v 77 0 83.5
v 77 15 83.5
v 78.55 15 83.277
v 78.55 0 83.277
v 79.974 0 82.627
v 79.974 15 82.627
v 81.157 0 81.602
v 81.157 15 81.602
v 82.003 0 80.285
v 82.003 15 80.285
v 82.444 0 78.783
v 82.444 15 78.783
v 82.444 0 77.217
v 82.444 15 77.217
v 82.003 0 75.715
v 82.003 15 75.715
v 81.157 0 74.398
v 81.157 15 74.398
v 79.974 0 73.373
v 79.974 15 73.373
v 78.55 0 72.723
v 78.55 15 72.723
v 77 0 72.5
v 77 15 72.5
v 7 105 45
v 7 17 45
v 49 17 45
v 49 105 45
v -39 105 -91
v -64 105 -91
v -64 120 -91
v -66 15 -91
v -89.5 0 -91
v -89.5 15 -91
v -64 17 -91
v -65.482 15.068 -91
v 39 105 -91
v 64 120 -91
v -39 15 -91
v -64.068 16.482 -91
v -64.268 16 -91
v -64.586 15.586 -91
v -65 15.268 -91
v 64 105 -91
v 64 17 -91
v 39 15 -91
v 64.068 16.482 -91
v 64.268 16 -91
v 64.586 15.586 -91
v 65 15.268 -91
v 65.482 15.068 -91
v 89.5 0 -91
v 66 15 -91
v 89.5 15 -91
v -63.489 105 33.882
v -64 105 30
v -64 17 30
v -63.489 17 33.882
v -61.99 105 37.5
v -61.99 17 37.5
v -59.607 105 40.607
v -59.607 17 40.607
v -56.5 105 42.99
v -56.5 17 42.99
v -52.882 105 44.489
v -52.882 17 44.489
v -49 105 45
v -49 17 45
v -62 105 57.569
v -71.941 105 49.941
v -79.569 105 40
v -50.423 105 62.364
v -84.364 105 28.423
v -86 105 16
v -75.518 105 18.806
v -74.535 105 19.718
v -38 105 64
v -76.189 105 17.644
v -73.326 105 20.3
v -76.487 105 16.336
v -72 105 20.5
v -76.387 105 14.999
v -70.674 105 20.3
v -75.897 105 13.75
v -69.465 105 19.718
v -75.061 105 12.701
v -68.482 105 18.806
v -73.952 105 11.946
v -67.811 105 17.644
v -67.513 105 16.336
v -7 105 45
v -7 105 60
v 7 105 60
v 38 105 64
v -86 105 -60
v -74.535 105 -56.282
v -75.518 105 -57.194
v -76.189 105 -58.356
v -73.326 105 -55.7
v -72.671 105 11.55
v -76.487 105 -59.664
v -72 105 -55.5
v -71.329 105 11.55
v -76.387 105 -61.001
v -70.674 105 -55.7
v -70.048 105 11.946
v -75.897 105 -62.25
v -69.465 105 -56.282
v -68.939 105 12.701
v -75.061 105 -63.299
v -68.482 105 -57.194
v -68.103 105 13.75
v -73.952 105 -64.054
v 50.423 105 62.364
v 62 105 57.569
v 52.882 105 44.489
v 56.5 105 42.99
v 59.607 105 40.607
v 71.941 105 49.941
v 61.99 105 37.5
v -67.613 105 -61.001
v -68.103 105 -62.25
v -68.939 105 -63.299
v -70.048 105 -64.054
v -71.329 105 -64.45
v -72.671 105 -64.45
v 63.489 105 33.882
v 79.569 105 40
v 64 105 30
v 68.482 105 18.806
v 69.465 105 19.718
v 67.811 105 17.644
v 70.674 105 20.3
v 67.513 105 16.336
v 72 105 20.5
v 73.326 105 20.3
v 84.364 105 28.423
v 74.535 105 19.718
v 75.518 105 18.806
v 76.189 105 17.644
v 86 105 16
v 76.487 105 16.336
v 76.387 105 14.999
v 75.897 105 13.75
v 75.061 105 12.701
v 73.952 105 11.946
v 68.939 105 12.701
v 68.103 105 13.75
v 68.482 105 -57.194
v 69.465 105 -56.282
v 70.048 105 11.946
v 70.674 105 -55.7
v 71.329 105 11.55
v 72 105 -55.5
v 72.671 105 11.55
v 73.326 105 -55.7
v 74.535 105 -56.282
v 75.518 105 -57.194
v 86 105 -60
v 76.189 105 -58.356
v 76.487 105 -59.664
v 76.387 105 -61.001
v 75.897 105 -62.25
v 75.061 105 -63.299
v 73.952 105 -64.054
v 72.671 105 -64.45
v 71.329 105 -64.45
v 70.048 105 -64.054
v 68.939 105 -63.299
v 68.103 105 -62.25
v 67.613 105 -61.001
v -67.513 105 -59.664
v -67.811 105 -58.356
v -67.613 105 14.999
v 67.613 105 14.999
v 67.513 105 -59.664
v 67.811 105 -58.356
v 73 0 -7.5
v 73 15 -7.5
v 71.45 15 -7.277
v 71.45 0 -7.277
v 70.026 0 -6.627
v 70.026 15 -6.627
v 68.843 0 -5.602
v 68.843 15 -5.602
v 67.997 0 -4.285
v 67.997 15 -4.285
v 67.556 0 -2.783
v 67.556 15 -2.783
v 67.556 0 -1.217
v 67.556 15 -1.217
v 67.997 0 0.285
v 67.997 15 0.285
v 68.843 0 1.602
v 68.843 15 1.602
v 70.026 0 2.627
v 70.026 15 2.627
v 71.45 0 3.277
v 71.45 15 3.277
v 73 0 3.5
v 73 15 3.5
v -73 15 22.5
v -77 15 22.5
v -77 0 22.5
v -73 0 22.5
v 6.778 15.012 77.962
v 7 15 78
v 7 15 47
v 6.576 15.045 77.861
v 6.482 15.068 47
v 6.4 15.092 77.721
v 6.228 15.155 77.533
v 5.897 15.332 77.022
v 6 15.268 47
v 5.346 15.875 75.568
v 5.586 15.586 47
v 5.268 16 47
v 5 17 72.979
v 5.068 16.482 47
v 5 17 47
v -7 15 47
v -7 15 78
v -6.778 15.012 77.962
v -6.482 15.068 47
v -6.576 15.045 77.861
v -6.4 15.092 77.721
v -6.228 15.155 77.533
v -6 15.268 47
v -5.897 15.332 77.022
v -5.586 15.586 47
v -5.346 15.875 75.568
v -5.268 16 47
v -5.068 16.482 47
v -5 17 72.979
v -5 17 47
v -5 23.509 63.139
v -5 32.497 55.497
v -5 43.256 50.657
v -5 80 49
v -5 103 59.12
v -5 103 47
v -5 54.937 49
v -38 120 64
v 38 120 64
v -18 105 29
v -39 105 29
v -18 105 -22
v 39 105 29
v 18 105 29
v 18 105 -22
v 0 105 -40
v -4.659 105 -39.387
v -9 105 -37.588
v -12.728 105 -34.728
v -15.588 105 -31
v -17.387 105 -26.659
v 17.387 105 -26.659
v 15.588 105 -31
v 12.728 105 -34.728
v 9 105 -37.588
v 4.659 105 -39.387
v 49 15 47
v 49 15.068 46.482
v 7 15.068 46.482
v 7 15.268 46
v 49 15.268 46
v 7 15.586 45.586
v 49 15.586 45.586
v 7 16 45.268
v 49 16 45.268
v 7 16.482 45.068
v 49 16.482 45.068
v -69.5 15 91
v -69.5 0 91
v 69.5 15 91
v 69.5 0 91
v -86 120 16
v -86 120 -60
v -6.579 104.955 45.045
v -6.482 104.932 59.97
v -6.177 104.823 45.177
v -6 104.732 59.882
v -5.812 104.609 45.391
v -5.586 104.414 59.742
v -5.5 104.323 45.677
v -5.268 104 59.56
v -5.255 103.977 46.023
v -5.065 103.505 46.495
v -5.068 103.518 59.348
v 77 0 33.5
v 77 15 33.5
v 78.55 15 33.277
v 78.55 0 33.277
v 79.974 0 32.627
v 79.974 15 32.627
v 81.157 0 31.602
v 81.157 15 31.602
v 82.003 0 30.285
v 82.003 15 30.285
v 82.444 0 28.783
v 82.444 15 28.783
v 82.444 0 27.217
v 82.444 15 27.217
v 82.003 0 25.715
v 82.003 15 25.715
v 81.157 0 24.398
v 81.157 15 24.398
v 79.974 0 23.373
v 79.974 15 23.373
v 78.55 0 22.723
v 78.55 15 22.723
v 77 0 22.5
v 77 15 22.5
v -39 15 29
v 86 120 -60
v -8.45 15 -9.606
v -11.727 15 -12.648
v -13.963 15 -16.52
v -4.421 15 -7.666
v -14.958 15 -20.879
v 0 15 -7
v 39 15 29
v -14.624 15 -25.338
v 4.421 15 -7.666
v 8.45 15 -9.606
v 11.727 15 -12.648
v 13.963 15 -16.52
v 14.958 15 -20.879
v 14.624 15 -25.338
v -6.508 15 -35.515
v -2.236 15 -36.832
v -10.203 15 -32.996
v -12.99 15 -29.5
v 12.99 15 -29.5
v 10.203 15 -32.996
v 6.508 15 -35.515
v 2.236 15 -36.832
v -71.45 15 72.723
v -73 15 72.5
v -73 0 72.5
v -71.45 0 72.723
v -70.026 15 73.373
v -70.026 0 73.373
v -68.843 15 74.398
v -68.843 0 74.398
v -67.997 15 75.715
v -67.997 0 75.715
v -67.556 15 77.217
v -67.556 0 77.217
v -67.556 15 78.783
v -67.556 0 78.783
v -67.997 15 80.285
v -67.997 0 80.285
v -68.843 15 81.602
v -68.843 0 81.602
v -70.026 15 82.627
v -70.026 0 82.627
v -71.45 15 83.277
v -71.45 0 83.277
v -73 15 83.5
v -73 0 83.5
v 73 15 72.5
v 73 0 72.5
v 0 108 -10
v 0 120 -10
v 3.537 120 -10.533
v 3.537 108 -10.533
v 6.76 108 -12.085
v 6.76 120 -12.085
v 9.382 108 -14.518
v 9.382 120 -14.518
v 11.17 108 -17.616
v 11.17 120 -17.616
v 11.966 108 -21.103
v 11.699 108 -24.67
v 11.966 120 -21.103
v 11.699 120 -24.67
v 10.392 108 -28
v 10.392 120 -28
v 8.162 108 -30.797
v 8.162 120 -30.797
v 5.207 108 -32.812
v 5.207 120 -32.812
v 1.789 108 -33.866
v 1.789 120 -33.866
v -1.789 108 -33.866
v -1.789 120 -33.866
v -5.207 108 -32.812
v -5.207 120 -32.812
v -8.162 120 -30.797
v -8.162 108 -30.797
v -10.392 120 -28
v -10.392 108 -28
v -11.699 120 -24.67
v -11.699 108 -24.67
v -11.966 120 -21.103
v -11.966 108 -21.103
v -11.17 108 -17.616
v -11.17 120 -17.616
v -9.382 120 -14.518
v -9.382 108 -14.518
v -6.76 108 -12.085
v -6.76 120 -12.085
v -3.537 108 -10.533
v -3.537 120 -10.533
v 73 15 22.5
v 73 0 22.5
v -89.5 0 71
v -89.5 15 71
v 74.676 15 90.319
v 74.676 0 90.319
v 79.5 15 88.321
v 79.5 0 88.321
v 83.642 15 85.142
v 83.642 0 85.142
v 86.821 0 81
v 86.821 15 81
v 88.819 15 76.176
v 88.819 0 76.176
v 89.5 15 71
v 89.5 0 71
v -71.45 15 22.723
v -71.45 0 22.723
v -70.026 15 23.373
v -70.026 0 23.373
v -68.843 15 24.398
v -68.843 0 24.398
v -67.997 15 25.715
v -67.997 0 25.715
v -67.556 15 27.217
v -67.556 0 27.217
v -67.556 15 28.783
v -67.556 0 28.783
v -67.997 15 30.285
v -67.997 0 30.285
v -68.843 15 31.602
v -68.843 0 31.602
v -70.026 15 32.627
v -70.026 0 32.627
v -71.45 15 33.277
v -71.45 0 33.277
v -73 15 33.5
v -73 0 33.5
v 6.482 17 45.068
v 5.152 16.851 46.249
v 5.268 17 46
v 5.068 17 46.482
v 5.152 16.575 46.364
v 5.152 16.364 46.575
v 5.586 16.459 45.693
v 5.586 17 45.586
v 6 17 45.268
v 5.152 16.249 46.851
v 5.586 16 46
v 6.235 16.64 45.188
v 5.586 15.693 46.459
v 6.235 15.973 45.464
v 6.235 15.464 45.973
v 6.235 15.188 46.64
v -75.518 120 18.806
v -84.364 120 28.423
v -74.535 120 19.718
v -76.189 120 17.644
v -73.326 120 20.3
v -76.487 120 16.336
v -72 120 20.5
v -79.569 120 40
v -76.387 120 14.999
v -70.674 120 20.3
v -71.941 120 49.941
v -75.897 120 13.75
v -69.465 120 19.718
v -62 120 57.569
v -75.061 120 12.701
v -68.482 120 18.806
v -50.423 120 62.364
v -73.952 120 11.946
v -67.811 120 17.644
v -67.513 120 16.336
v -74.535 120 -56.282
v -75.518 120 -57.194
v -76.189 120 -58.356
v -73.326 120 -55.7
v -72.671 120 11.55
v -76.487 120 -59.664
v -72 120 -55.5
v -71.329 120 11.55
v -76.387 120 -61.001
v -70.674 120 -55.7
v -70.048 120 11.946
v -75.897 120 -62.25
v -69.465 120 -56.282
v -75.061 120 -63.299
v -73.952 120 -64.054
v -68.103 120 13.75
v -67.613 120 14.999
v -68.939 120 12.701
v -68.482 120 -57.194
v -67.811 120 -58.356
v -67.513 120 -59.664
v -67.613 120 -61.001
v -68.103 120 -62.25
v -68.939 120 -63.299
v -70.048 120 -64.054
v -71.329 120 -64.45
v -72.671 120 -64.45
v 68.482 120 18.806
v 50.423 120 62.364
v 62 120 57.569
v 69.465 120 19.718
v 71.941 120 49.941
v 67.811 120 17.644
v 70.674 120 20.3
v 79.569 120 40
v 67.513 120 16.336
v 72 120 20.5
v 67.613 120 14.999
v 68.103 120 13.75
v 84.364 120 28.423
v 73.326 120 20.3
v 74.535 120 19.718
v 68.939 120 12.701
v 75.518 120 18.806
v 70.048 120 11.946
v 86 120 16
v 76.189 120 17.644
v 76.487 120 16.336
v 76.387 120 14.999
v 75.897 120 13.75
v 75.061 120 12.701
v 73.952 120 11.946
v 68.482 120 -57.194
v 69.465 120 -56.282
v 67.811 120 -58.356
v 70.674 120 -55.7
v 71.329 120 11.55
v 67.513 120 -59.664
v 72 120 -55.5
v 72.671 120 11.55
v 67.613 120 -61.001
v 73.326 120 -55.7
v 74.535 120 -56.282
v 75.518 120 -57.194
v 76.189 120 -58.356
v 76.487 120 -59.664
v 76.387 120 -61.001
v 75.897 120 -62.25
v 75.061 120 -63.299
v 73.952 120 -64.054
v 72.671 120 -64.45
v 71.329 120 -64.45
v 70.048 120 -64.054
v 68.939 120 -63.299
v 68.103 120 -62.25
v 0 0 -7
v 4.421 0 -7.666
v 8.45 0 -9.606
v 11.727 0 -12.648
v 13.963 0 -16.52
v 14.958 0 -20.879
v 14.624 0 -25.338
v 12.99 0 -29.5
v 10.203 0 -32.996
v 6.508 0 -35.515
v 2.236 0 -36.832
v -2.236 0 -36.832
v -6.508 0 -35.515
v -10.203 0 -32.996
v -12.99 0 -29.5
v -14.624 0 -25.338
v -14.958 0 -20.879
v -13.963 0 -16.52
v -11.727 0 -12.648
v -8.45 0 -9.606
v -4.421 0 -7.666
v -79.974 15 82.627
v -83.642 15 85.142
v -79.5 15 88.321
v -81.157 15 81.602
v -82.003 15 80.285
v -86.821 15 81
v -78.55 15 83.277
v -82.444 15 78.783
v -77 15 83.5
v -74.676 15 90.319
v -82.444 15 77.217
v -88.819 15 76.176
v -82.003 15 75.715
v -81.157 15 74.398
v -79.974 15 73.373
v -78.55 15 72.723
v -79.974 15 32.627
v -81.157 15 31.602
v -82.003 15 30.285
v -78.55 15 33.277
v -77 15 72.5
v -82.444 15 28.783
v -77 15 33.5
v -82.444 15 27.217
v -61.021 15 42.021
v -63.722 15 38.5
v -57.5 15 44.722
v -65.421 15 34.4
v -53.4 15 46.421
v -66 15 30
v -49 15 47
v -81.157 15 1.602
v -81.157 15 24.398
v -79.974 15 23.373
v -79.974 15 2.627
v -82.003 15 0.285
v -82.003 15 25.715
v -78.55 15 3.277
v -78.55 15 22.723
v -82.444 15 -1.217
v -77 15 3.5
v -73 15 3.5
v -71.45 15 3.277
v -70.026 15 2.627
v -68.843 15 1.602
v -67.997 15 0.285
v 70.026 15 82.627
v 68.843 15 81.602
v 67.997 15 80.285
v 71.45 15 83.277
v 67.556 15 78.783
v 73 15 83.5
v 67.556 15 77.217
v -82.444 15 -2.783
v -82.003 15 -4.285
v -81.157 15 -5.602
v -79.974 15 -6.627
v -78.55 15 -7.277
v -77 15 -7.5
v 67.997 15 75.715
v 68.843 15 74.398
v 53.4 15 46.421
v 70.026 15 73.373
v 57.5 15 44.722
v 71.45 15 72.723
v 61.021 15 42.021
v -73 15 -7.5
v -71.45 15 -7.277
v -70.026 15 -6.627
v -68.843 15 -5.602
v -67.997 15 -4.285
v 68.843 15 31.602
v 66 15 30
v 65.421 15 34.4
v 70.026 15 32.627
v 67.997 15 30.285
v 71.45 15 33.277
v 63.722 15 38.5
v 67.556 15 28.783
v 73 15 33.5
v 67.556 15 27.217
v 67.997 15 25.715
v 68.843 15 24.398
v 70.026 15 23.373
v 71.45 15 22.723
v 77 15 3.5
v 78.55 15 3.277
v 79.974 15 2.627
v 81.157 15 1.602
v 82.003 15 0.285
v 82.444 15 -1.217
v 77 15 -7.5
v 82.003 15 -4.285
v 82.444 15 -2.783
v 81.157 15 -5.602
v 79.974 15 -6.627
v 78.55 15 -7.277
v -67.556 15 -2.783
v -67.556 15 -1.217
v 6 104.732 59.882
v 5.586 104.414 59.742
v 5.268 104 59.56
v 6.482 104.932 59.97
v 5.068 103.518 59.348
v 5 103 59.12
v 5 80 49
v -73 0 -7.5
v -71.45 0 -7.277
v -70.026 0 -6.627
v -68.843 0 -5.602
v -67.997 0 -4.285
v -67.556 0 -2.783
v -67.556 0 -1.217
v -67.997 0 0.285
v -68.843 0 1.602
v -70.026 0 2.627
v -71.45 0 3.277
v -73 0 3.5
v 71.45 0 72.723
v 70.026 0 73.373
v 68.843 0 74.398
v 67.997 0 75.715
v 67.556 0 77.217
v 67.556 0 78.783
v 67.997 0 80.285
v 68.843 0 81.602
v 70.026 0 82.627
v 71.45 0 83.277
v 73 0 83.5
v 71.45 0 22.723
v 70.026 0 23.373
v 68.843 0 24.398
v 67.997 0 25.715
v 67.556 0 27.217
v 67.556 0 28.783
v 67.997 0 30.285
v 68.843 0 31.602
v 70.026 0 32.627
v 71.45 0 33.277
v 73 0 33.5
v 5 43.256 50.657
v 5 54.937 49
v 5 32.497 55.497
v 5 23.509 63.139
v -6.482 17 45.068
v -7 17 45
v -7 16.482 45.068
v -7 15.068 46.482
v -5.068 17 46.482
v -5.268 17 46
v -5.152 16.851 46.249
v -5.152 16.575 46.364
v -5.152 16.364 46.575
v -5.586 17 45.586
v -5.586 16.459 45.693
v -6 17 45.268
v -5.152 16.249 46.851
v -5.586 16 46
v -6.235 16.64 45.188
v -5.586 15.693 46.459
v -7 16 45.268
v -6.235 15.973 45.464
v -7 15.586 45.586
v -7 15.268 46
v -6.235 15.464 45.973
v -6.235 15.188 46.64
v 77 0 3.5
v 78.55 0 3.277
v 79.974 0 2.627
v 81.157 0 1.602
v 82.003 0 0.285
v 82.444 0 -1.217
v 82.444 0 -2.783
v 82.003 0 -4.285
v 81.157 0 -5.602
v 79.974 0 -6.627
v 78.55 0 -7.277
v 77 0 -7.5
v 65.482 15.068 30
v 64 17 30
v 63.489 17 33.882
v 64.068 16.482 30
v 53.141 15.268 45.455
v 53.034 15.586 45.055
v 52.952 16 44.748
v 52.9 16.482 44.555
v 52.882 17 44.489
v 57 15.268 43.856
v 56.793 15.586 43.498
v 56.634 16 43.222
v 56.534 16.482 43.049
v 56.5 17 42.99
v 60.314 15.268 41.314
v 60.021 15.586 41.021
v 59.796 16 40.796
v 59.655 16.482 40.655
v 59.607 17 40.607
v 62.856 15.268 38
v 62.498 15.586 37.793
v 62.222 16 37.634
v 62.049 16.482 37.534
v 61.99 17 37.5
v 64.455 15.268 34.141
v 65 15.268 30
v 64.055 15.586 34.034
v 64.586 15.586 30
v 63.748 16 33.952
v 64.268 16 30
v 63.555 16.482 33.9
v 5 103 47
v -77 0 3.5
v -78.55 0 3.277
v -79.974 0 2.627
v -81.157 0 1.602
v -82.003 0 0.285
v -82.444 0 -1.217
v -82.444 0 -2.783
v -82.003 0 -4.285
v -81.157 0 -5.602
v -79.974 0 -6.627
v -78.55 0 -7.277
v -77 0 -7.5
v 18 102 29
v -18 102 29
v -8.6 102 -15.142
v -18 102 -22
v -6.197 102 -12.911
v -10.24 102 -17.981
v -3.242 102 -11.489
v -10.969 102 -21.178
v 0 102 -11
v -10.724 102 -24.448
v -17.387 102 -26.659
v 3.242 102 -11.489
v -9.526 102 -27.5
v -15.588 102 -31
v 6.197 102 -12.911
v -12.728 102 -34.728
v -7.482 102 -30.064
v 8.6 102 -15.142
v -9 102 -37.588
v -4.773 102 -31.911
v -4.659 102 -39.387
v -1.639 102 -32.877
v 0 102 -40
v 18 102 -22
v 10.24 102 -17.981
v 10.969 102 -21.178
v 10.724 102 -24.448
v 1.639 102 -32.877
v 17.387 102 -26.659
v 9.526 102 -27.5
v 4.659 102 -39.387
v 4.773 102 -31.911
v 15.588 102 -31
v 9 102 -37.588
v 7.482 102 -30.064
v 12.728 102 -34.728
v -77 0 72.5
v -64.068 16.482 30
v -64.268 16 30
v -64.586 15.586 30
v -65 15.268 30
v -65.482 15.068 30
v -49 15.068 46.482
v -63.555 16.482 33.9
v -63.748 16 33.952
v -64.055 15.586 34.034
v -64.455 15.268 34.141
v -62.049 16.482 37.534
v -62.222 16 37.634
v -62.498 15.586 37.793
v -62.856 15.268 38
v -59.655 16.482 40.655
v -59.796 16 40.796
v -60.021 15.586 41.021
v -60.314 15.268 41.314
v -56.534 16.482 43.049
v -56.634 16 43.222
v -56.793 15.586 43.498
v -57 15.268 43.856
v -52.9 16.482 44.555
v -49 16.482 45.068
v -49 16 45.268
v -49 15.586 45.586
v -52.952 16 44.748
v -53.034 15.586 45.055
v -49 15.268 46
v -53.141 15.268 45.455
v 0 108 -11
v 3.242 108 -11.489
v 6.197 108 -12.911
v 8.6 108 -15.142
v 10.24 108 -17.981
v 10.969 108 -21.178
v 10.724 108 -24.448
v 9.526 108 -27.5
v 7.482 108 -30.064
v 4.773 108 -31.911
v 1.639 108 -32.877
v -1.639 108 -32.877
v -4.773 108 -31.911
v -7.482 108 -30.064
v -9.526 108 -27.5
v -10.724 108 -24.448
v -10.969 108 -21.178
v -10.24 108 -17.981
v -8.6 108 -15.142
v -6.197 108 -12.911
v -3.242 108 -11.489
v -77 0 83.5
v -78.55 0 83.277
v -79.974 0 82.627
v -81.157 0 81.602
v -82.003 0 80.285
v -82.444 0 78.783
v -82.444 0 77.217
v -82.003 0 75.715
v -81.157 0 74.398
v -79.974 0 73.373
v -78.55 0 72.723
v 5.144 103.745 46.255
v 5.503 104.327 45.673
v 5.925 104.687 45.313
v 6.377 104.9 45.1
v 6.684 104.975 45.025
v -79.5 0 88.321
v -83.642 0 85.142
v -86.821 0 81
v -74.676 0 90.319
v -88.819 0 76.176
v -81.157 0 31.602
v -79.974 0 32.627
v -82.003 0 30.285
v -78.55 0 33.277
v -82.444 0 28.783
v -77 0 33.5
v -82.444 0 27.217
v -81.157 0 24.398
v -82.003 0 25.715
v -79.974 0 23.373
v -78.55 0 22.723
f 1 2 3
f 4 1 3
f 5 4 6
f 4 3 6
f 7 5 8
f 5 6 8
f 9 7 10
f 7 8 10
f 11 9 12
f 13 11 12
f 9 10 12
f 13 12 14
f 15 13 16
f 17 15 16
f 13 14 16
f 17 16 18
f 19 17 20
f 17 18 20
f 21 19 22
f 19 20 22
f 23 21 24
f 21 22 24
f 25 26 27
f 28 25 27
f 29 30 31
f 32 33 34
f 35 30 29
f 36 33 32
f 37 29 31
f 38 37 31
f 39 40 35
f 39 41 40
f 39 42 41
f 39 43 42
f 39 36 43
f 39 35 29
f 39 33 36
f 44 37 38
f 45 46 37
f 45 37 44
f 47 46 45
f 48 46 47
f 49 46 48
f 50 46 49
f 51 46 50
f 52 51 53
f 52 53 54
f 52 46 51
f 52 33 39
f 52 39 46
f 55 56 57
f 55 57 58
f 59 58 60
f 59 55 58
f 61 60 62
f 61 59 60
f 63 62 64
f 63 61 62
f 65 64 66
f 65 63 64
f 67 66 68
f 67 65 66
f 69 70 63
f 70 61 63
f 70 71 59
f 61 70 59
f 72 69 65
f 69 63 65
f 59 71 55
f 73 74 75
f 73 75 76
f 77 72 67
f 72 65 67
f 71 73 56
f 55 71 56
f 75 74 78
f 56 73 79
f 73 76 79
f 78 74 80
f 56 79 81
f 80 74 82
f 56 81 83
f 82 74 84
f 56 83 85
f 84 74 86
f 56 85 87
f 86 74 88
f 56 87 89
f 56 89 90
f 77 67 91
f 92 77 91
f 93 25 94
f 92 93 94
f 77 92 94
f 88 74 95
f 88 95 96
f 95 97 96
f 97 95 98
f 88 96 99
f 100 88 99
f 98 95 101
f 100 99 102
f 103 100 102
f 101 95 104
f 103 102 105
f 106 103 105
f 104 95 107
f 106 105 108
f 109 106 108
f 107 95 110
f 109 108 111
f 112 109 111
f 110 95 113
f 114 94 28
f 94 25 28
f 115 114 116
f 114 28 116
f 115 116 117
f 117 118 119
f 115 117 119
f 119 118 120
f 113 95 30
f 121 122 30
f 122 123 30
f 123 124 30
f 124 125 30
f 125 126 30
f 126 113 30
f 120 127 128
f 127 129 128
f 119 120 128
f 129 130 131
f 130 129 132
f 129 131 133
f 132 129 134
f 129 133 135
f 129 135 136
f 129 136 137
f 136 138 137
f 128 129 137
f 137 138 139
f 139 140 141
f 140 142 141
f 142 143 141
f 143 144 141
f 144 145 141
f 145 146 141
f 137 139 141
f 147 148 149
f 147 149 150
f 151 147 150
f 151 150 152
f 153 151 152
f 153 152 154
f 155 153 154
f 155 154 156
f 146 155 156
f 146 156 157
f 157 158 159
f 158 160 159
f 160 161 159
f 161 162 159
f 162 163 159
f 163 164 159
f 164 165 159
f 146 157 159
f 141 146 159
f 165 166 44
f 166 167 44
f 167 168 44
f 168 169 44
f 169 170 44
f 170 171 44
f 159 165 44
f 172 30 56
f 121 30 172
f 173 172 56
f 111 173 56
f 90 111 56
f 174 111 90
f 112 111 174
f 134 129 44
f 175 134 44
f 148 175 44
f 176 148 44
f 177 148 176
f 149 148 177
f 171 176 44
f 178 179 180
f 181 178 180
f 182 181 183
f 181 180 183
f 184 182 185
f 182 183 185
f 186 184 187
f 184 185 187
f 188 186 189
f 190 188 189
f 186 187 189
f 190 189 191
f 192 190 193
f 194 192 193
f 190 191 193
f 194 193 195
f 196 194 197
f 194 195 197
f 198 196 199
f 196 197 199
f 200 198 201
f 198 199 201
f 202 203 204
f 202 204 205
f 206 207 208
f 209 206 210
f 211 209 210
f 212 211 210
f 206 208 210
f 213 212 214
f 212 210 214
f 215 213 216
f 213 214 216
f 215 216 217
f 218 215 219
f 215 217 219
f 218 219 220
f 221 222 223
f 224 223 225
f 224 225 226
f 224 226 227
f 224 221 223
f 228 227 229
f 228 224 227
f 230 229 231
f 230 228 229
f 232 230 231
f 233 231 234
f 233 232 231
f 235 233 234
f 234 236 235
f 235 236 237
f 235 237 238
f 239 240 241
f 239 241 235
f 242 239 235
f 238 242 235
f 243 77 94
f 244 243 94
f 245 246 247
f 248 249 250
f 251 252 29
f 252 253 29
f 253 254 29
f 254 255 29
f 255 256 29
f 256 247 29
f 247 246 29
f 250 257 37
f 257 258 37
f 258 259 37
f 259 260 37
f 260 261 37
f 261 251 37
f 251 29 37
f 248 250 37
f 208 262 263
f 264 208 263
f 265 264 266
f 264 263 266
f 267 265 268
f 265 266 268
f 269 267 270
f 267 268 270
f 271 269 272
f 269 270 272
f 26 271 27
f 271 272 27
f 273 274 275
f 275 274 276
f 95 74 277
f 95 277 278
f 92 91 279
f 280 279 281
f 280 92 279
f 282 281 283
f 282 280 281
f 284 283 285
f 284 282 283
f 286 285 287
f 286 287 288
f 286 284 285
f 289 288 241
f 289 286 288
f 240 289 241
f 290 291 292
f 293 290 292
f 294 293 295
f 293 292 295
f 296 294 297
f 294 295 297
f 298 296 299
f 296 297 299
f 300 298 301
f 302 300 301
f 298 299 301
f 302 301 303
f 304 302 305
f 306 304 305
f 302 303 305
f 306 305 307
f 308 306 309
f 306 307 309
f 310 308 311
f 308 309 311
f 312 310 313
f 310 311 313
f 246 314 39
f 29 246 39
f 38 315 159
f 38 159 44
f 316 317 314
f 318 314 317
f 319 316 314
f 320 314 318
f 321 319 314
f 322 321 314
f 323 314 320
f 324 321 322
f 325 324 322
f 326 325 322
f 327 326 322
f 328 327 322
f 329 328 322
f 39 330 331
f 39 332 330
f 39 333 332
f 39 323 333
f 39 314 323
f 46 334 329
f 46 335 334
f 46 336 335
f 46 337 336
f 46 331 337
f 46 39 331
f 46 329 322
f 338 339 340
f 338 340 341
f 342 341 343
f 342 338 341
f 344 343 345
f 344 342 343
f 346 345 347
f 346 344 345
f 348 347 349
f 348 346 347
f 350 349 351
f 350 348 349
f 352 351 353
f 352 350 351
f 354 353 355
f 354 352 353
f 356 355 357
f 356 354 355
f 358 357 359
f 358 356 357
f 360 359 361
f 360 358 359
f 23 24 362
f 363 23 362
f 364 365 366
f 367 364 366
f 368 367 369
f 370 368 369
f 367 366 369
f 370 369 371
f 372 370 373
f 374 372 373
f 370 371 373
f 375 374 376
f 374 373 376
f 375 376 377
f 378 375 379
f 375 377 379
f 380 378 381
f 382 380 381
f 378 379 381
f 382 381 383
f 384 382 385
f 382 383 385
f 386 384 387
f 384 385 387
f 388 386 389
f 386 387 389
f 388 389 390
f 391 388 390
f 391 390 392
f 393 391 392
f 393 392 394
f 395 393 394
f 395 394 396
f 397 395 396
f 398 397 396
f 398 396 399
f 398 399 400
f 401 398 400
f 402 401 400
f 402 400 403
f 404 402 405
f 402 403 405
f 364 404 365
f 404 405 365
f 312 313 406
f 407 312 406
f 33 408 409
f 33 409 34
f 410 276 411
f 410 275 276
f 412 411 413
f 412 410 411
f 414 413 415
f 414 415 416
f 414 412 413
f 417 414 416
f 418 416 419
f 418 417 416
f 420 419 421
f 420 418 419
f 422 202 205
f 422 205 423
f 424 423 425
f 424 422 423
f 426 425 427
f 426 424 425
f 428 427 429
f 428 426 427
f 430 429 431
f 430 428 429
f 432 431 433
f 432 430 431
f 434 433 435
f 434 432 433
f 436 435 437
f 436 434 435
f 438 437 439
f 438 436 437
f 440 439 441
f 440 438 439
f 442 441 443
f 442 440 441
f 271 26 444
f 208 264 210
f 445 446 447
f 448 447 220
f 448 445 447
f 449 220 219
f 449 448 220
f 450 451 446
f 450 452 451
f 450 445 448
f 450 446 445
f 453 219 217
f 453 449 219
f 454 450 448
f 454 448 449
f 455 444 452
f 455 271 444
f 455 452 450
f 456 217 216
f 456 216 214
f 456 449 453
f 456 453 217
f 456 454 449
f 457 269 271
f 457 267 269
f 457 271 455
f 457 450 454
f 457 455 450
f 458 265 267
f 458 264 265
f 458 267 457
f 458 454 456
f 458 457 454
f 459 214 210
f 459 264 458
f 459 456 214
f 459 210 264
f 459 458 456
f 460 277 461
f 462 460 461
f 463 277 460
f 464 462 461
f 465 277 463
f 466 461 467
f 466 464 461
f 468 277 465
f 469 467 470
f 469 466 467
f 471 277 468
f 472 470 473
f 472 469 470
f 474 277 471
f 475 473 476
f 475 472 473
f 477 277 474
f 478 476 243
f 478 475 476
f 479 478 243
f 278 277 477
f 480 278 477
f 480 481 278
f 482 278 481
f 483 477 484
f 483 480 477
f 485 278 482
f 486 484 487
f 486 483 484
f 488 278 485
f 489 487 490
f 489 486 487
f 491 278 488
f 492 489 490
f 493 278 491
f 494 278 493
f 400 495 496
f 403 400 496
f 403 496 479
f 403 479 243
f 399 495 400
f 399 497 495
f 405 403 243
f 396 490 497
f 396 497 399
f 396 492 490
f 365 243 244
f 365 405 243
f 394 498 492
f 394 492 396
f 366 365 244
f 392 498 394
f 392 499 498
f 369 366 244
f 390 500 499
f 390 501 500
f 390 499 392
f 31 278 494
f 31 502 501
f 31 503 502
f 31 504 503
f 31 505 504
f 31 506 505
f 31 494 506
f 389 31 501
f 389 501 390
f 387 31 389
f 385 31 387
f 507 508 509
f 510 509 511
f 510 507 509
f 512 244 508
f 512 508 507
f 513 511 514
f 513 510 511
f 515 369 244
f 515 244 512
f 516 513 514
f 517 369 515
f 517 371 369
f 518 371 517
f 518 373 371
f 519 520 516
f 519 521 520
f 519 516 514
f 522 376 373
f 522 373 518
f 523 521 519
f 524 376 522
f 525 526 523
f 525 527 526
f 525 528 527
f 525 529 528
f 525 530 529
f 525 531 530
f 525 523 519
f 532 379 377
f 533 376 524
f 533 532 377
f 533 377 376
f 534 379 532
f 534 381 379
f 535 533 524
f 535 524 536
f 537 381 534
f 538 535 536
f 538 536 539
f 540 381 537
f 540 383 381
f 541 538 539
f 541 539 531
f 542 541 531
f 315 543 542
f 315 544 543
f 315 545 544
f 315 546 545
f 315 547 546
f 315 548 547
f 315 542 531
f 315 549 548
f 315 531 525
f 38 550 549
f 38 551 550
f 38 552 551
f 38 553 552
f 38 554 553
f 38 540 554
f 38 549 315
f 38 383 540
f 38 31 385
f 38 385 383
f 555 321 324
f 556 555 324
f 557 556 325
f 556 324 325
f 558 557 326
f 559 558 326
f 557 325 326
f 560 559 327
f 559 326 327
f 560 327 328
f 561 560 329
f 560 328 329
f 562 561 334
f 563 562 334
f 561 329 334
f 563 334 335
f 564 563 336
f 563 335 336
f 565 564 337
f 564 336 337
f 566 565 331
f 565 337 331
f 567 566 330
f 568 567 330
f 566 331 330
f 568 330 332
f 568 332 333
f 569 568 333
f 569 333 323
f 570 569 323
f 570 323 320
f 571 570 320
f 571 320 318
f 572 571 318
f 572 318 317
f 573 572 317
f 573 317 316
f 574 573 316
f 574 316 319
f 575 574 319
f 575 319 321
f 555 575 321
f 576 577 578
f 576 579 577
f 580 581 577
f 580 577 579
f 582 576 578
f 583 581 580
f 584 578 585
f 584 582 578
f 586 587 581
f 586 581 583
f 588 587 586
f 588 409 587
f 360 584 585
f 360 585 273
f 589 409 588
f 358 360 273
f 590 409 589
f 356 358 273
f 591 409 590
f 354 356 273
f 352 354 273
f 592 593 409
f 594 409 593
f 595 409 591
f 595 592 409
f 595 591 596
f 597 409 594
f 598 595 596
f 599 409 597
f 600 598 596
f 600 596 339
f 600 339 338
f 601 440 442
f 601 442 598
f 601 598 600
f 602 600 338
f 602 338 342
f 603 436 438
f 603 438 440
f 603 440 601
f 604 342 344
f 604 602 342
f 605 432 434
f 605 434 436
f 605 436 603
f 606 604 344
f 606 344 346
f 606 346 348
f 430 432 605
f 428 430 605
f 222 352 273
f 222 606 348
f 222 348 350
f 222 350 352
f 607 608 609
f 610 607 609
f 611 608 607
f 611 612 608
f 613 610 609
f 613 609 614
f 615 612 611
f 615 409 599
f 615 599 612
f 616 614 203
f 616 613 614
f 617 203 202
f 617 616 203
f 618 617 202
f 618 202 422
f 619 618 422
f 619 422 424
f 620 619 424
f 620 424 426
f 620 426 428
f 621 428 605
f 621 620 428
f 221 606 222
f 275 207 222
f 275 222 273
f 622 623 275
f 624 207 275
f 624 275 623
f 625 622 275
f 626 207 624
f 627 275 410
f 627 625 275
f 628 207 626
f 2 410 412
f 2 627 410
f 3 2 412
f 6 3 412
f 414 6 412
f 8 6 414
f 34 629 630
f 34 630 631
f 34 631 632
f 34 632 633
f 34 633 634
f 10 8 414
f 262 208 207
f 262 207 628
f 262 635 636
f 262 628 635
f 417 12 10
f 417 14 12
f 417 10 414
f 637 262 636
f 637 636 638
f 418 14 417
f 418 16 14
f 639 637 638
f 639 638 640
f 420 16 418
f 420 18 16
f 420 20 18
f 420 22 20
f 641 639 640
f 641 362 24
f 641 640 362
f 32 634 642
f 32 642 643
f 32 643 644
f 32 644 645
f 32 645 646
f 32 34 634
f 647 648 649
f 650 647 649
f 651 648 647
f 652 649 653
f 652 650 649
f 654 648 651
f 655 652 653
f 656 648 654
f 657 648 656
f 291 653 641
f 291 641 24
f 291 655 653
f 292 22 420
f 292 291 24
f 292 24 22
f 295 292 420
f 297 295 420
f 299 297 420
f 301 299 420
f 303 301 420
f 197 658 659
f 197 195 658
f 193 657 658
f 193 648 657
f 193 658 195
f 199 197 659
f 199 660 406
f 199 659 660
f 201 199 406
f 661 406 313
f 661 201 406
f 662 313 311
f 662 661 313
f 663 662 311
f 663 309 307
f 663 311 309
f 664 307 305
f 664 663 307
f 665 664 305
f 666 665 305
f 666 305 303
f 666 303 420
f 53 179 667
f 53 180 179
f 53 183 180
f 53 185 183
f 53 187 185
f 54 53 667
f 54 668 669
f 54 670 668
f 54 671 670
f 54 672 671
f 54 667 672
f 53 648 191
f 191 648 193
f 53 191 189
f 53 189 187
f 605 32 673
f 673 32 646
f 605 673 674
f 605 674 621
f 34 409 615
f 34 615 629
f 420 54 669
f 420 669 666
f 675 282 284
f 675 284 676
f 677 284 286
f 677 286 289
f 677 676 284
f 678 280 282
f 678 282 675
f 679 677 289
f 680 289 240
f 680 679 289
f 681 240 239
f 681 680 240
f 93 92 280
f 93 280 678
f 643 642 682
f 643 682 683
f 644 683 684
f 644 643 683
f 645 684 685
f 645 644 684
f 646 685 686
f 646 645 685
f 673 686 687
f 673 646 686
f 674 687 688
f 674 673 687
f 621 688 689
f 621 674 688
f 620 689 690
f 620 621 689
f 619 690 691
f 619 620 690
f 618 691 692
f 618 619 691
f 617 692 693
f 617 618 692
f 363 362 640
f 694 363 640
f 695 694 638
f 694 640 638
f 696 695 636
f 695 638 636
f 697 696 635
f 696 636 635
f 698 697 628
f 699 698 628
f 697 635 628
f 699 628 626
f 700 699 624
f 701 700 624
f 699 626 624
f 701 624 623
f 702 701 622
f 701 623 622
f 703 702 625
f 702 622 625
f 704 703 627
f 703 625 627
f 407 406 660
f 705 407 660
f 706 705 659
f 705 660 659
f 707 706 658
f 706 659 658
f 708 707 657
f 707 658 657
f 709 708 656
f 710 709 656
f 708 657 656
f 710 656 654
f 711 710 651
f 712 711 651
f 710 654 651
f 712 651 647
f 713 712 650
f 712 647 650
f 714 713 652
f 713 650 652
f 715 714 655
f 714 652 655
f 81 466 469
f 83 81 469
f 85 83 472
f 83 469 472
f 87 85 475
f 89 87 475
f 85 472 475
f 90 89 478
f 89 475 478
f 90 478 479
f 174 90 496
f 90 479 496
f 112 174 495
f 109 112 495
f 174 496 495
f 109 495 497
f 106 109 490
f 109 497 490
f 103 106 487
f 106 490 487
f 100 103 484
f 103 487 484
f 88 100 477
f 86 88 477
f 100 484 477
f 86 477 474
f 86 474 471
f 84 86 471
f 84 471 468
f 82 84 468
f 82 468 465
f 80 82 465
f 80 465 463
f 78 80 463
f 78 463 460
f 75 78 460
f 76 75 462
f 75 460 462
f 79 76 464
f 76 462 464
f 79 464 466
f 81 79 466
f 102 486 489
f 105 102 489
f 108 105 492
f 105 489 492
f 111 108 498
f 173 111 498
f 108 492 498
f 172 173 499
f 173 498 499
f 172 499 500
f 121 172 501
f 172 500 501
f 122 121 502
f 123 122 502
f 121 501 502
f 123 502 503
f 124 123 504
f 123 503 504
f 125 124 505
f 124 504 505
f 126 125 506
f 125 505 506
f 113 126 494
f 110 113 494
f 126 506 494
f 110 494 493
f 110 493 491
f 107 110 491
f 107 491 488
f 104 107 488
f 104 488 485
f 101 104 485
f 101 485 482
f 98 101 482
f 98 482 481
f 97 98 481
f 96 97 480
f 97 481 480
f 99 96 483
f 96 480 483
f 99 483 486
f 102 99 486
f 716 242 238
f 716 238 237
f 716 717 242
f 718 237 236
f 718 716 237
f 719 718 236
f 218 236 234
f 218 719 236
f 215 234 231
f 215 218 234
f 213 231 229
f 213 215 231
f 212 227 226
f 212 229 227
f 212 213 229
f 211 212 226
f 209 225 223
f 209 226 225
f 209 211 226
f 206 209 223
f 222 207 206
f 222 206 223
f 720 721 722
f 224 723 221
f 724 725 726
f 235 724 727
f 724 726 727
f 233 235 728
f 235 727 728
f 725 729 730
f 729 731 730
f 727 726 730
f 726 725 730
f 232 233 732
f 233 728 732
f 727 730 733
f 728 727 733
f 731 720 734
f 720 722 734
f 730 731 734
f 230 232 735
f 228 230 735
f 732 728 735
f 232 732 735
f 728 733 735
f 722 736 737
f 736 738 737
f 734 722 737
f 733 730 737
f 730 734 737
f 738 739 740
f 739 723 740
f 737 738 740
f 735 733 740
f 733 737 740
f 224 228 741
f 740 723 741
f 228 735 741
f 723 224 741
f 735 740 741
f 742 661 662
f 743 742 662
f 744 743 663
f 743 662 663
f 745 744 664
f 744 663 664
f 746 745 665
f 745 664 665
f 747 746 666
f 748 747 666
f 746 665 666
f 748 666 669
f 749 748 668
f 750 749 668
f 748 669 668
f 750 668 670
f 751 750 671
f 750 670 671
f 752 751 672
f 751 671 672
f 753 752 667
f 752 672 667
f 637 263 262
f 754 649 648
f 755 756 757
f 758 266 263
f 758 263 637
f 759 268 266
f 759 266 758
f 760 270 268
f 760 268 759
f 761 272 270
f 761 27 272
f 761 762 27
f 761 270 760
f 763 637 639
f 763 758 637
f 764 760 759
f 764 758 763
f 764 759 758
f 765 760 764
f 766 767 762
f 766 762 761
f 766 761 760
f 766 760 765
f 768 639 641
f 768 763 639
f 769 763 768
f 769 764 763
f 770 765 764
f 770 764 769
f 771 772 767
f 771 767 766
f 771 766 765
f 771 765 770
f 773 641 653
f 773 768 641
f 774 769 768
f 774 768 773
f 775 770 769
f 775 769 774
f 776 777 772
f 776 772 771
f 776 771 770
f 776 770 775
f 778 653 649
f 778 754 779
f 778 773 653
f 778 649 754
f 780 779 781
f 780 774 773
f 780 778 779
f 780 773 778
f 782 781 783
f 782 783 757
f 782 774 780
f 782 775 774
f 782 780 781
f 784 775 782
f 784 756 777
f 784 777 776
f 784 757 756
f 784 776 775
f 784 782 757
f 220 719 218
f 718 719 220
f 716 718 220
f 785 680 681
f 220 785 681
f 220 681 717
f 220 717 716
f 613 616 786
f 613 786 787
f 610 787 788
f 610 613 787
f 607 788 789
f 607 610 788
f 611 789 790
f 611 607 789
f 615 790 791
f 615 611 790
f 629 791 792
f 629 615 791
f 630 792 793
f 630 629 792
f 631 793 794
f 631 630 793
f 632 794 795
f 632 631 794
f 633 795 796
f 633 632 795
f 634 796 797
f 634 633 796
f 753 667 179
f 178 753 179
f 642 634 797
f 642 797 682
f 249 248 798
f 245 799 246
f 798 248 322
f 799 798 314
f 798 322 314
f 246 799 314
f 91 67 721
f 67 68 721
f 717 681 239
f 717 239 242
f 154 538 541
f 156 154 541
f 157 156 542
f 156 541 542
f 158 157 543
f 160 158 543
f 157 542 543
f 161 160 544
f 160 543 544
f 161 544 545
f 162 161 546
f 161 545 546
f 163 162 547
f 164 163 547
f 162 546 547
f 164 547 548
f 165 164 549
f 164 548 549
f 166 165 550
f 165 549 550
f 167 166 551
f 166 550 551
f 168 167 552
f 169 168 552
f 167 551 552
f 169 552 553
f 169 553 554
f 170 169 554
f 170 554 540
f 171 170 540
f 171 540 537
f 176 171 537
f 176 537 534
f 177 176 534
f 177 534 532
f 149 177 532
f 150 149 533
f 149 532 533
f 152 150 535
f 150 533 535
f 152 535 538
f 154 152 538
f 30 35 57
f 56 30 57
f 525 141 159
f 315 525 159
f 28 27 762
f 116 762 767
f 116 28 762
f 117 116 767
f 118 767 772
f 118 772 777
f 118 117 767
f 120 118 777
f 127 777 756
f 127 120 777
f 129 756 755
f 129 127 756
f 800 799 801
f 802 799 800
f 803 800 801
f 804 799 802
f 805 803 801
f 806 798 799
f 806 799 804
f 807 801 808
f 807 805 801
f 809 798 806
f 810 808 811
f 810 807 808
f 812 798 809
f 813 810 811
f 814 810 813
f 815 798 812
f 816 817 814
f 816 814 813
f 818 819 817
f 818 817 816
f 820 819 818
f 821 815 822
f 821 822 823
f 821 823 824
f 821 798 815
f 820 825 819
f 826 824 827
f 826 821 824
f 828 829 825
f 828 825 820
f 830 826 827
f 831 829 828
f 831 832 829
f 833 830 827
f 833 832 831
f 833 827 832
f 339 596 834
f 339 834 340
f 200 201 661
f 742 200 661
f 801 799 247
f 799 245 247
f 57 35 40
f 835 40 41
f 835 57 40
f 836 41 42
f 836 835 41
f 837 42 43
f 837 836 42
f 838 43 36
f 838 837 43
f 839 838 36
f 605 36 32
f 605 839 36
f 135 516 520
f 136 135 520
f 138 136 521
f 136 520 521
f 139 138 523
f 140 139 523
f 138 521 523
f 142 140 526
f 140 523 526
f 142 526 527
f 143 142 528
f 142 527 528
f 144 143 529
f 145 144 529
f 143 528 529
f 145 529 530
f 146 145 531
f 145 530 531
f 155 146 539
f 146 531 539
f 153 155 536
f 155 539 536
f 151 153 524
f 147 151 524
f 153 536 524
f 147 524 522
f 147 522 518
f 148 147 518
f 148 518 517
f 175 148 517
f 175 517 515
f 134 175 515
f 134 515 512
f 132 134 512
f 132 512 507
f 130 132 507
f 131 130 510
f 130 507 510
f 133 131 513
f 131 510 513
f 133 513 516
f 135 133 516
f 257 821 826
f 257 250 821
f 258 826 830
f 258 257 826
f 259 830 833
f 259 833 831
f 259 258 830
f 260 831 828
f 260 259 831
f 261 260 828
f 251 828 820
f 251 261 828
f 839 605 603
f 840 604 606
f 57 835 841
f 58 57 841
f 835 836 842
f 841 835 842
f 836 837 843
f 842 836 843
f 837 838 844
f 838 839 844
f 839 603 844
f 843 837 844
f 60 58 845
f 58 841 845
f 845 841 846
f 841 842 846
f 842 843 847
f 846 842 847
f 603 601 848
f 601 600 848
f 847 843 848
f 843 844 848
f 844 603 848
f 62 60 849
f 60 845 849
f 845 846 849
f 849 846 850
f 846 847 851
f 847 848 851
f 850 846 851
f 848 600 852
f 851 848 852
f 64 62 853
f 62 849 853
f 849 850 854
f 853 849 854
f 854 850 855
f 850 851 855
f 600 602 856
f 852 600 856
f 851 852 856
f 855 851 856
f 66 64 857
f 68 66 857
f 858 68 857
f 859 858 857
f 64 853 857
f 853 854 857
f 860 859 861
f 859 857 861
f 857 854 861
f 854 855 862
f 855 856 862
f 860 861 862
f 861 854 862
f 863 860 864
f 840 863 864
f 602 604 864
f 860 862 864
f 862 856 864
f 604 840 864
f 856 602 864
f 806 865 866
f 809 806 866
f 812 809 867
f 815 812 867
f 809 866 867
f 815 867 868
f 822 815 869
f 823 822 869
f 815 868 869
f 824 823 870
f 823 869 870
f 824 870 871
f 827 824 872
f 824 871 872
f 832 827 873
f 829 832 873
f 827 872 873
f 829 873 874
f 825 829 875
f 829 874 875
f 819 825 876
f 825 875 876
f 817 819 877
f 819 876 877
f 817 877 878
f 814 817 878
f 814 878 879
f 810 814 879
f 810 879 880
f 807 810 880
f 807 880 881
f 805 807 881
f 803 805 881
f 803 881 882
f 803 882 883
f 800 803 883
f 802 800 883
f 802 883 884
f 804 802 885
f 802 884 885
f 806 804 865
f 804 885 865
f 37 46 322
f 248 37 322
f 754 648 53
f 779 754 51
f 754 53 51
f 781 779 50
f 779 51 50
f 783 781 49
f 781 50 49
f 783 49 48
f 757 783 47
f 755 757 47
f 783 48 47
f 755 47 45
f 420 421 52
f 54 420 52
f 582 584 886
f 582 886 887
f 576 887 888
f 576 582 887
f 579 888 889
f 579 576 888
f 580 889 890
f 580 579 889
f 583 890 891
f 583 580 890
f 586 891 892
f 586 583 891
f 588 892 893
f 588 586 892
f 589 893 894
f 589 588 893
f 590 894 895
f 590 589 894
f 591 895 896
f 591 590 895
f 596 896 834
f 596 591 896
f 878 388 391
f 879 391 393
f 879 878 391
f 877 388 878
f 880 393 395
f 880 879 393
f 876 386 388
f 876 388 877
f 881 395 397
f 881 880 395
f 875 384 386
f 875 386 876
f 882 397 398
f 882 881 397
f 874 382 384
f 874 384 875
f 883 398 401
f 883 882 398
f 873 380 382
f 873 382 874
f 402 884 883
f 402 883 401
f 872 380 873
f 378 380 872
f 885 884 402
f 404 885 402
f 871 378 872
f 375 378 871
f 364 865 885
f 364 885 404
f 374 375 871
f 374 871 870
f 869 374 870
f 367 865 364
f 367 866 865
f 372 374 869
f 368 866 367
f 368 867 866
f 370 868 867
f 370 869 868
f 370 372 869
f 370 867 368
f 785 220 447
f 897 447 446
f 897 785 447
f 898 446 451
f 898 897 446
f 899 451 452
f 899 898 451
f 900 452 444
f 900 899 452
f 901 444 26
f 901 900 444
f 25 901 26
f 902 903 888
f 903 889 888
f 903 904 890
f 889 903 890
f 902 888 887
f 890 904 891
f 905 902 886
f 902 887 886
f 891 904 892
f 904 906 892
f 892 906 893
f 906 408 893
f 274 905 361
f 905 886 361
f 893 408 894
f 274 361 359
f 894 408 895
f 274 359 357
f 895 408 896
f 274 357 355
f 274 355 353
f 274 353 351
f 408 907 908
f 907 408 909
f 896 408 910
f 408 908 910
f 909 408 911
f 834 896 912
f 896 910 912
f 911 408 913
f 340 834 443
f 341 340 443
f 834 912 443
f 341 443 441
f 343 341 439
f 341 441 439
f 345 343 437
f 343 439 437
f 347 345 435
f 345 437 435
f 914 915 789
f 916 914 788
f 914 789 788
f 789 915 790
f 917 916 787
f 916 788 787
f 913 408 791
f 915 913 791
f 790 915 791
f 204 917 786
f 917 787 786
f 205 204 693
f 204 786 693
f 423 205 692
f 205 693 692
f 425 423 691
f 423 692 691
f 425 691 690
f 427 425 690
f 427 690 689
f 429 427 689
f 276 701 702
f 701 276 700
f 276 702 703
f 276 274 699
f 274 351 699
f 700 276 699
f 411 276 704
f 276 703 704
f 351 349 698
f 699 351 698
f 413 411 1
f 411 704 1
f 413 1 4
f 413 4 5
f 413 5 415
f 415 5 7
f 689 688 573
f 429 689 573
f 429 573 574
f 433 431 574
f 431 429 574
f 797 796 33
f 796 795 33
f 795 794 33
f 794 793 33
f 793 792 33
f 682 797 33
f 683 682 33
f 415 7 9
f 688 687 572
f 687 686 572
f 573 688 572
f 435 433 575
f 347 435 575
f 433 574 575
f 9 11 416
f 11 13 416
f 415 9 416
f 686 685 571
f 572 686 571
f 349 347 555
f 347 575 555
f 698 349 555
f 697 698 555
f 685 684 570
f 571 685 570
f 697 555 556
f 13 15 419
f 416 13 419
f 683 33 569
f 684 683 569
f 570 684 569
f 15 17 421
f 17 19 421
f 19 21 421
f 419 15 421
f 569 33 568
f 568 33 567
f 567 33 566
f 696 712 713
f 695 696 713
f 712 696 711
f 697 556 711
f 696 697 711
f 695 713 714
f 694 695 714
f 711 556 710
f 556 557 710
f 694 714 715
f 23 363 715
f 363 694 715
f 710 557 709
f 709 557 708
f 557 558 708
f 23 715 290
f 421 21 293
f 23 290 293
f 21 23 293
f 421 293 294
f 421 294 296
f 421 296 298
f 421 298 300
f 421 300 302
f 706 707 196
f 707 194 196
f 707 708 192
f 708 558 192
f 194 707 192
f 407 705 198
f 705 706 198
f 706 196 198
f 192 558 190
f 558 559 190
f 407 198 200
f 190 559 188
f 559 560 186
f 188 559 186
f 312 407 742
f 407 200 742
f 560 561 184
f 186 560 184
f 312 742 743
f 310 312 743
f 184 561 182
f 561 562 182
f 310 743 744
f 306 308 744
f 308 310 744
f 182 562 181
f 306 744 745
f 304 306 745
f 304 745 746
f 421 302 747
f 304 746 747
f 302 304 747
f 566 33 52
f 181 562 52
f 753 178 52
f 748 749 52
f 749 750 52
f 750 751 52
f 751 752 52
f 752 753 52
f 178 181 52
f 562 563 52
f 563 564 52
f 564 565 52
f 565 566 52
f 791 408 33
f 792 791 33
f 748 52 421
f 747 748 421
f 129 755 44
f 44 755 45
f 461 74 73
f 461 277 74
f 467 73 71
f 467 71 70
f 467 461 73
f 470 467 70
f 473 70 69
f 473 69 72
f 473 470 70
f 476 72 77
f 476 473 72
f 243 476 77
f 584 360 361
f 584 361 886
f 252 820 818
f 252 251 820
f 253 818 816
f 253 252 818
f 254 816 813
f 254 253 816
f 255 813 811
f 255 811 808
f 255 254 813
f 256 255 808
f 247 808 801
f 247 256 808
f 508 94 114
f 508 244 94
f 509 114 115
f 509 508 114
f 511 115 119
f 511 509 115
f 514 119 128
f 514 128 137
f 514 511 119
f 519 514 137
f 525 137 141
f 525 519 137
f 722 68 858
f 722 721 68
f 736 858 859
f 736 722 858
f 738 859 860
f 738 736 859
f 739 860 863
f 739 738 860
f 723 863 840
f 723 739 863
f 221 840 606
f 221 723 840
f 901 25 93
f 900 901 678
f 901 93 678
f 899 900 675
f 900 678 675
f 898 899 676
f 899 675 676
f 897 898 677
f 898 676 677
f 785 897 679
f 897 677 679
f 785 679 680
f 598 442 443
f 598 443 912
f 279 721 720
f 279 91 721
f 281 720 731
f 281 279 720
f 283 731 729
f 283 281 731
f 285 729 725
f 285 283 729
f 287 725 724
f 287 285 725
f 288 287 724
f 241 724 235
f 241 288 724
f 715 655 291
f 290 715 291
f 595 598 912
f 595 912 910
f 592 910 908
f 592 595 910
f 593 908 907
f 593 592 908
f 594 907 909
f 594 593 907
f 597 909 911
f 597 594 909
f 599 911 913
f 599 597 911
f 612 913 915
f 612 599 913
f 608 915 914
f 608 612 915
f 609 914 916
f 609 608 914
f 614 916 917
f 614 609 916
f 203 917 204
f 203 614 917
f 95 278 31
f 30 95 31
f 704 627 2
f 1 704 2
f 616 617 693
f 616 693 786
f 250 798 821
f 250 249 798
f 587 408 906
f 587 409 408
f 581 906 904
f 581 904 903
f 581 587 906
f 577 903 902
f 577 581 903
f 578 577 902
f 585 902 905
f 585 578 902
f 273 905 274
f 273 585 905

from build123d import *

# Parameters (mm, degrees)
SKETCH_1_W          = 179
SKETCH_1_H          = 182
EXTRUDE_1_DEPTH     = 15
SKETCH_2_R          = 15
CUT_EXTRUDE_1_DEPTH = 129.51556326
CUT_EXTRUDE_3_DEPTH = 129.51556326
FILLET_1_R          = 20
EXTRUDE_2_DEPTH     = 90
FILLET_2_R          = 15
EXTRUDE_3_DEPTH     = 5
SKETCH_7_W          = 172
SKETCH_7_H          = 155
EXTRUDE_4_DEPTH     = 15
CUT_EXTRUDE_4_DEPTH = 15
FILLET_3_R          = 48
SKETCH_9_R          = 4.5
CUT_EXTRUDE_5_DEPTH = 15
SKETCH_11_W         = 69
SKETCH_11_H         = 3
EXTRUDE_5_DEPTH     = 18
FILLET_4_R          = 18
SKETCH_12_R         = 12
CUT_EXTRUDE_6_DEPTH = 12
SKETCH_13_R         = 11
CUT_EXTRUDE_7_DEPTH = 6
FILLET_5_R          = 2


with BuildPart() as part:
    # 草图1 → 凸台-拉伸1 (new body)
    with BuildSketch(Plane(origin=(0, 0, 0), x_dir=(1, 0, 0), z_dir=(0, 1, 0))):
        Rectangle(SKETCH_1_W, SKETCH_1_H)
    extrude(amount=EXTRUDE_1_DEPTH)

    # 草图2 → 切除-拉伸1 (cut, through all)
    with BuildSketch(Plane(origin=(0, 15, 0), x_dir=(1, 0, 0), z_dir=(0, 1, 0))):
        with Locations(Location((0, 22, 0), (0, 0, 270))):
            Circle(SKETCH_2_R)
    extrude(amount=-CUT_EXTRUDE_1_DEPTH, mode=Mode.SUBTRACT)

    # 草图4 → 切除-拉伸3 (cut, through all)
    with BuildSketch(Plane(origin=(0, 15, 0), x_dir=(1, 0, 0), z_dir=(0, 1, 0))):
        with BuildLine():
            Line((-77, -72.5), (-73, -72.5))
            ThreePointArc((-73, -72.5), (-67.5, -78), (-73, -83.5))
            Line((-73, -83.5), (-77, -83.5))
            ThreePointArc((-77, -83.5), (-82.5, -78), (-77, -72.5))
        make_face()
        with BuildLine():
            Line((-77, -22.5), (-73, -22.5))
            ThreePointArc((-73, -22.5), (-67.5, -28), (-73, -33.5))
            Line((-73, -33.5), (-77, -33.5))
            ThreePointArc((-77, -33.5), (-82.5, -28), (-77, -22.5))
        make_face()
        with BuildLine():
            Line((-77, 7.5), (-73, 7.5))
            ThreePointArc((-73, 7.5), (-67.5, 2), (-73, -3.5))
            Line((-73, -3.5), (-77, -3.5))
            ThreePointArc((-77, -3.5), (-82.5, 2), (-77, 7.5))
        make_face()
        with BuildLine():
            Line((77, 7.5), (73, 7.5))
            ThreePointArc((73, 7.5), (67.5, 2), (73, -3.5))
            Line((73, -3.5), (77, -3.5))
            ThreePointArc((77, -3.5), (82.5, 2), (77, 7.5))
        make_face()
        with BuildLine():
            Line((77, -22.5), (73, -22.5))
            ThreePointArc((73, -22.5), (67.5, -28), (73, -33.5))
            Line((73, -33.5), (77, -33.5))
            ThreePointArc((77, -33.5), (82.5, -28), (77, -22.5))
        make_face()
        with BuildLine():
            Line((77, -72.5), (73, -72.5))
            ThreePointArc((73, -72.5), (67.5, -78), (73, -83.5))
            Line((73, -83.5), (77, -83.5))
            ThreePointArc((77, -83.5), (82.5, -78), (77, -72.5))
        make_face()
    extrude(amount=-CUT_EXTRUDE_3_DEPTH, mode=Mode.SUBTRACT)

    # 圆角1
    fillet_1_edges = [part.edges().sort_by_distance(p)[0] for p in [
        (89.5, 7.5, 91),
        (-89.5, 7.5, 91),
    ]]
    fillet(fillet_1_edges, radius=FILLET_1_R)

    # 草图5 → 凸台-拉伸2 (add)
    with BuildSketch(Plane(origin=(0, 15, 0), x_dir=(1, 0, 0), z_dir=(0, 1, 0))):
        Polygon((-64, 91), (-64, -45), (64, -45), (64, 91), (39, 91), (39, -29), (-39, -29), (-39, 91), align=None)
    extrude(amount=EXTRUDE_2_DEPTH)

    # 圆角2
    fillet_2_edges = [part.edges().sort_by_distance(p)[0] for p in [
        (-64, 60, 45),
        (64, 60, 45),
    ]]
    fillet(fillet_2_edges, radius=FILLET_2_R)

    # 草图6 → 凸台-拉伸3 (add, symmetric)
    with BuildSketch(Plane(origin=(0, 0, 0), x_dir=(0, 0, -1), z_dir=(1, 0, 0))):
        with BuildLine():
            Line((-45, 105), (-60, 105))
            Line((-60, 105), (-49, 80))
            Line((-49, 80), (-49, 54.937451095))
            ThreePointArc((-49, 54.937451095), (-57.014709064, 30.259525737), (-78, 15))
            Line((-78, 15), (-45, 15))
            Line((-45, 15), (-45, 105))
        make_face()
    extrude(amount=EXTRUDE_3_DEPTH, both=True)

    # 草图7 → 凸台-拉伸4 (add)
    with BuildSketch(Plane(origin=(0, 105, 0), x_dir=(1, 0, 0), z_dir=(0, 1, 0))):
        with Locations((0, 13.5)):
            Rectangle(SKETCH_7_W, SKETCH_7_H)
    extrude(amount=EXTRUDE_4_DEPTH)

    # 草图8 → 切除-拉伸4 (cut)
    with BuildSketch(Plane(origin=(0, 120, 0), x_dir=(1, 0, 0), z_dir=(0, 1, 0))):
        Polygon((-86, 91), (-86, 60), (-64, 91), align=None)
        Polygon((64, 91), (86, 91), (86, 60), align=None)
    extrude(amount=-CUT_EXTRUDE_4_DEPTH, mode=Mode.SUBTRACT)

    # 圆角3
    fillet_3_edges = [part.edges().sort_by_distance(p)[0] for p in [
        (-86, 112.5, 64),
        (86, 112.5, 64),
    ]]
    fillet(fillet_3_edges, radius=FILLET_3_R)

    # 草图9 → 切除-拉伸5 (cut)
    with BuildSketch(Plane(origin=(0, 120, 0), x_dir=(1, 0, 0), z_dir=(0, 1, 0))):
        with Locations(Location((-72, 60, 0), (0, 0, 270))):
            Circle(SKETCH_9_R)
        with Locations(Location((-72, -16, 0), (0, 0, 270))):
            Circle(SKETCH_9_R)
        with Locations(Location((72, -16, 0), (0, 0, 270))):
            Circle(SKETCH_9_R)
        with Locations(Location((72, 60, 0), (0, 0, 270))):
            Circle(SKETCH_9_R)
    extrude(amount=-CUT_EXTRUDE_5_DEPTH, mode=Mode.SUBTRACT)

    # 草图11 → 凸台-拉伸5 (add, symmetric)
    with BuildSketch(Plane(origin=(0, 0, 0), x_dir=(0, 0, -1), z_dir=(1, 0, 0))):
        with Locations((5.5, 103.5)):
            Rectangle(SKETCH_11_W, SKETCH_11_H)
    extrude(amount=EXTRUDE_5_DEPTH, both=True)

    # 圆角4
    fillet_4_edges = [part.edges().sort_by_distance(p)[0] for p in [
        (-18, 103.5, -40),
        (18, 103.5, -40),
    ]]
    fillet(fillet_4_edges, radius=FILLET_4_R - 0.0001)  # a hair under: the kernel refuses the full size

    # 草图12 → 切除-拉伸6 (cut)
    with BuildSketch(Plane(origin=(0, 120, 0), x_dir=(1, 0, 0), z_dir=(0, 1, 0))):
        with Locations(Location((0, 22, 0), (0, 0, 270))):
            Circle(SKETCH_12_R)
    extrude(amount=-CUT_EXTRUDE_6_DEPTH, mode=Mode.SUBTRACT)

    # 草图13 → 切除-拉伸7 (cut)
    with BuildSketch(Plane(origin=(0, 108, 0), x_dir=(1, 0, 0), z_dir=(0, 1, 0))):
        with Locations(Location((0, 22, 0), (0, 0, 270))):
            Circle(SKETCH_13_R)
    extrude(amount=-CUT_EXTRUDE_7_DEPTH, mode=Mode.SUBTRACT)

    # 圆角5
    fillet_5_edges = [part.edges().sort_by_distance(p)[0] for p in [
        (-64, 15, -30.5),
        (64, 15, -30.5),
        (-27, 15, 45),
        (59.606601718, 15, 40.606601718),
        (-59.606601718, 15, 40.606601718),
        (27, 15, 45),
        (-5, 60, 45),
        (-5, 105, 52.5),
        (-5, 15, 61.5),
        (5, 60, 45),
        (5, 105, 52.5),
        (5, 15, 61.5),
    ]]
    fillet(fillet_5_edges, radius=FILLET_5_R)


solid = part.part
